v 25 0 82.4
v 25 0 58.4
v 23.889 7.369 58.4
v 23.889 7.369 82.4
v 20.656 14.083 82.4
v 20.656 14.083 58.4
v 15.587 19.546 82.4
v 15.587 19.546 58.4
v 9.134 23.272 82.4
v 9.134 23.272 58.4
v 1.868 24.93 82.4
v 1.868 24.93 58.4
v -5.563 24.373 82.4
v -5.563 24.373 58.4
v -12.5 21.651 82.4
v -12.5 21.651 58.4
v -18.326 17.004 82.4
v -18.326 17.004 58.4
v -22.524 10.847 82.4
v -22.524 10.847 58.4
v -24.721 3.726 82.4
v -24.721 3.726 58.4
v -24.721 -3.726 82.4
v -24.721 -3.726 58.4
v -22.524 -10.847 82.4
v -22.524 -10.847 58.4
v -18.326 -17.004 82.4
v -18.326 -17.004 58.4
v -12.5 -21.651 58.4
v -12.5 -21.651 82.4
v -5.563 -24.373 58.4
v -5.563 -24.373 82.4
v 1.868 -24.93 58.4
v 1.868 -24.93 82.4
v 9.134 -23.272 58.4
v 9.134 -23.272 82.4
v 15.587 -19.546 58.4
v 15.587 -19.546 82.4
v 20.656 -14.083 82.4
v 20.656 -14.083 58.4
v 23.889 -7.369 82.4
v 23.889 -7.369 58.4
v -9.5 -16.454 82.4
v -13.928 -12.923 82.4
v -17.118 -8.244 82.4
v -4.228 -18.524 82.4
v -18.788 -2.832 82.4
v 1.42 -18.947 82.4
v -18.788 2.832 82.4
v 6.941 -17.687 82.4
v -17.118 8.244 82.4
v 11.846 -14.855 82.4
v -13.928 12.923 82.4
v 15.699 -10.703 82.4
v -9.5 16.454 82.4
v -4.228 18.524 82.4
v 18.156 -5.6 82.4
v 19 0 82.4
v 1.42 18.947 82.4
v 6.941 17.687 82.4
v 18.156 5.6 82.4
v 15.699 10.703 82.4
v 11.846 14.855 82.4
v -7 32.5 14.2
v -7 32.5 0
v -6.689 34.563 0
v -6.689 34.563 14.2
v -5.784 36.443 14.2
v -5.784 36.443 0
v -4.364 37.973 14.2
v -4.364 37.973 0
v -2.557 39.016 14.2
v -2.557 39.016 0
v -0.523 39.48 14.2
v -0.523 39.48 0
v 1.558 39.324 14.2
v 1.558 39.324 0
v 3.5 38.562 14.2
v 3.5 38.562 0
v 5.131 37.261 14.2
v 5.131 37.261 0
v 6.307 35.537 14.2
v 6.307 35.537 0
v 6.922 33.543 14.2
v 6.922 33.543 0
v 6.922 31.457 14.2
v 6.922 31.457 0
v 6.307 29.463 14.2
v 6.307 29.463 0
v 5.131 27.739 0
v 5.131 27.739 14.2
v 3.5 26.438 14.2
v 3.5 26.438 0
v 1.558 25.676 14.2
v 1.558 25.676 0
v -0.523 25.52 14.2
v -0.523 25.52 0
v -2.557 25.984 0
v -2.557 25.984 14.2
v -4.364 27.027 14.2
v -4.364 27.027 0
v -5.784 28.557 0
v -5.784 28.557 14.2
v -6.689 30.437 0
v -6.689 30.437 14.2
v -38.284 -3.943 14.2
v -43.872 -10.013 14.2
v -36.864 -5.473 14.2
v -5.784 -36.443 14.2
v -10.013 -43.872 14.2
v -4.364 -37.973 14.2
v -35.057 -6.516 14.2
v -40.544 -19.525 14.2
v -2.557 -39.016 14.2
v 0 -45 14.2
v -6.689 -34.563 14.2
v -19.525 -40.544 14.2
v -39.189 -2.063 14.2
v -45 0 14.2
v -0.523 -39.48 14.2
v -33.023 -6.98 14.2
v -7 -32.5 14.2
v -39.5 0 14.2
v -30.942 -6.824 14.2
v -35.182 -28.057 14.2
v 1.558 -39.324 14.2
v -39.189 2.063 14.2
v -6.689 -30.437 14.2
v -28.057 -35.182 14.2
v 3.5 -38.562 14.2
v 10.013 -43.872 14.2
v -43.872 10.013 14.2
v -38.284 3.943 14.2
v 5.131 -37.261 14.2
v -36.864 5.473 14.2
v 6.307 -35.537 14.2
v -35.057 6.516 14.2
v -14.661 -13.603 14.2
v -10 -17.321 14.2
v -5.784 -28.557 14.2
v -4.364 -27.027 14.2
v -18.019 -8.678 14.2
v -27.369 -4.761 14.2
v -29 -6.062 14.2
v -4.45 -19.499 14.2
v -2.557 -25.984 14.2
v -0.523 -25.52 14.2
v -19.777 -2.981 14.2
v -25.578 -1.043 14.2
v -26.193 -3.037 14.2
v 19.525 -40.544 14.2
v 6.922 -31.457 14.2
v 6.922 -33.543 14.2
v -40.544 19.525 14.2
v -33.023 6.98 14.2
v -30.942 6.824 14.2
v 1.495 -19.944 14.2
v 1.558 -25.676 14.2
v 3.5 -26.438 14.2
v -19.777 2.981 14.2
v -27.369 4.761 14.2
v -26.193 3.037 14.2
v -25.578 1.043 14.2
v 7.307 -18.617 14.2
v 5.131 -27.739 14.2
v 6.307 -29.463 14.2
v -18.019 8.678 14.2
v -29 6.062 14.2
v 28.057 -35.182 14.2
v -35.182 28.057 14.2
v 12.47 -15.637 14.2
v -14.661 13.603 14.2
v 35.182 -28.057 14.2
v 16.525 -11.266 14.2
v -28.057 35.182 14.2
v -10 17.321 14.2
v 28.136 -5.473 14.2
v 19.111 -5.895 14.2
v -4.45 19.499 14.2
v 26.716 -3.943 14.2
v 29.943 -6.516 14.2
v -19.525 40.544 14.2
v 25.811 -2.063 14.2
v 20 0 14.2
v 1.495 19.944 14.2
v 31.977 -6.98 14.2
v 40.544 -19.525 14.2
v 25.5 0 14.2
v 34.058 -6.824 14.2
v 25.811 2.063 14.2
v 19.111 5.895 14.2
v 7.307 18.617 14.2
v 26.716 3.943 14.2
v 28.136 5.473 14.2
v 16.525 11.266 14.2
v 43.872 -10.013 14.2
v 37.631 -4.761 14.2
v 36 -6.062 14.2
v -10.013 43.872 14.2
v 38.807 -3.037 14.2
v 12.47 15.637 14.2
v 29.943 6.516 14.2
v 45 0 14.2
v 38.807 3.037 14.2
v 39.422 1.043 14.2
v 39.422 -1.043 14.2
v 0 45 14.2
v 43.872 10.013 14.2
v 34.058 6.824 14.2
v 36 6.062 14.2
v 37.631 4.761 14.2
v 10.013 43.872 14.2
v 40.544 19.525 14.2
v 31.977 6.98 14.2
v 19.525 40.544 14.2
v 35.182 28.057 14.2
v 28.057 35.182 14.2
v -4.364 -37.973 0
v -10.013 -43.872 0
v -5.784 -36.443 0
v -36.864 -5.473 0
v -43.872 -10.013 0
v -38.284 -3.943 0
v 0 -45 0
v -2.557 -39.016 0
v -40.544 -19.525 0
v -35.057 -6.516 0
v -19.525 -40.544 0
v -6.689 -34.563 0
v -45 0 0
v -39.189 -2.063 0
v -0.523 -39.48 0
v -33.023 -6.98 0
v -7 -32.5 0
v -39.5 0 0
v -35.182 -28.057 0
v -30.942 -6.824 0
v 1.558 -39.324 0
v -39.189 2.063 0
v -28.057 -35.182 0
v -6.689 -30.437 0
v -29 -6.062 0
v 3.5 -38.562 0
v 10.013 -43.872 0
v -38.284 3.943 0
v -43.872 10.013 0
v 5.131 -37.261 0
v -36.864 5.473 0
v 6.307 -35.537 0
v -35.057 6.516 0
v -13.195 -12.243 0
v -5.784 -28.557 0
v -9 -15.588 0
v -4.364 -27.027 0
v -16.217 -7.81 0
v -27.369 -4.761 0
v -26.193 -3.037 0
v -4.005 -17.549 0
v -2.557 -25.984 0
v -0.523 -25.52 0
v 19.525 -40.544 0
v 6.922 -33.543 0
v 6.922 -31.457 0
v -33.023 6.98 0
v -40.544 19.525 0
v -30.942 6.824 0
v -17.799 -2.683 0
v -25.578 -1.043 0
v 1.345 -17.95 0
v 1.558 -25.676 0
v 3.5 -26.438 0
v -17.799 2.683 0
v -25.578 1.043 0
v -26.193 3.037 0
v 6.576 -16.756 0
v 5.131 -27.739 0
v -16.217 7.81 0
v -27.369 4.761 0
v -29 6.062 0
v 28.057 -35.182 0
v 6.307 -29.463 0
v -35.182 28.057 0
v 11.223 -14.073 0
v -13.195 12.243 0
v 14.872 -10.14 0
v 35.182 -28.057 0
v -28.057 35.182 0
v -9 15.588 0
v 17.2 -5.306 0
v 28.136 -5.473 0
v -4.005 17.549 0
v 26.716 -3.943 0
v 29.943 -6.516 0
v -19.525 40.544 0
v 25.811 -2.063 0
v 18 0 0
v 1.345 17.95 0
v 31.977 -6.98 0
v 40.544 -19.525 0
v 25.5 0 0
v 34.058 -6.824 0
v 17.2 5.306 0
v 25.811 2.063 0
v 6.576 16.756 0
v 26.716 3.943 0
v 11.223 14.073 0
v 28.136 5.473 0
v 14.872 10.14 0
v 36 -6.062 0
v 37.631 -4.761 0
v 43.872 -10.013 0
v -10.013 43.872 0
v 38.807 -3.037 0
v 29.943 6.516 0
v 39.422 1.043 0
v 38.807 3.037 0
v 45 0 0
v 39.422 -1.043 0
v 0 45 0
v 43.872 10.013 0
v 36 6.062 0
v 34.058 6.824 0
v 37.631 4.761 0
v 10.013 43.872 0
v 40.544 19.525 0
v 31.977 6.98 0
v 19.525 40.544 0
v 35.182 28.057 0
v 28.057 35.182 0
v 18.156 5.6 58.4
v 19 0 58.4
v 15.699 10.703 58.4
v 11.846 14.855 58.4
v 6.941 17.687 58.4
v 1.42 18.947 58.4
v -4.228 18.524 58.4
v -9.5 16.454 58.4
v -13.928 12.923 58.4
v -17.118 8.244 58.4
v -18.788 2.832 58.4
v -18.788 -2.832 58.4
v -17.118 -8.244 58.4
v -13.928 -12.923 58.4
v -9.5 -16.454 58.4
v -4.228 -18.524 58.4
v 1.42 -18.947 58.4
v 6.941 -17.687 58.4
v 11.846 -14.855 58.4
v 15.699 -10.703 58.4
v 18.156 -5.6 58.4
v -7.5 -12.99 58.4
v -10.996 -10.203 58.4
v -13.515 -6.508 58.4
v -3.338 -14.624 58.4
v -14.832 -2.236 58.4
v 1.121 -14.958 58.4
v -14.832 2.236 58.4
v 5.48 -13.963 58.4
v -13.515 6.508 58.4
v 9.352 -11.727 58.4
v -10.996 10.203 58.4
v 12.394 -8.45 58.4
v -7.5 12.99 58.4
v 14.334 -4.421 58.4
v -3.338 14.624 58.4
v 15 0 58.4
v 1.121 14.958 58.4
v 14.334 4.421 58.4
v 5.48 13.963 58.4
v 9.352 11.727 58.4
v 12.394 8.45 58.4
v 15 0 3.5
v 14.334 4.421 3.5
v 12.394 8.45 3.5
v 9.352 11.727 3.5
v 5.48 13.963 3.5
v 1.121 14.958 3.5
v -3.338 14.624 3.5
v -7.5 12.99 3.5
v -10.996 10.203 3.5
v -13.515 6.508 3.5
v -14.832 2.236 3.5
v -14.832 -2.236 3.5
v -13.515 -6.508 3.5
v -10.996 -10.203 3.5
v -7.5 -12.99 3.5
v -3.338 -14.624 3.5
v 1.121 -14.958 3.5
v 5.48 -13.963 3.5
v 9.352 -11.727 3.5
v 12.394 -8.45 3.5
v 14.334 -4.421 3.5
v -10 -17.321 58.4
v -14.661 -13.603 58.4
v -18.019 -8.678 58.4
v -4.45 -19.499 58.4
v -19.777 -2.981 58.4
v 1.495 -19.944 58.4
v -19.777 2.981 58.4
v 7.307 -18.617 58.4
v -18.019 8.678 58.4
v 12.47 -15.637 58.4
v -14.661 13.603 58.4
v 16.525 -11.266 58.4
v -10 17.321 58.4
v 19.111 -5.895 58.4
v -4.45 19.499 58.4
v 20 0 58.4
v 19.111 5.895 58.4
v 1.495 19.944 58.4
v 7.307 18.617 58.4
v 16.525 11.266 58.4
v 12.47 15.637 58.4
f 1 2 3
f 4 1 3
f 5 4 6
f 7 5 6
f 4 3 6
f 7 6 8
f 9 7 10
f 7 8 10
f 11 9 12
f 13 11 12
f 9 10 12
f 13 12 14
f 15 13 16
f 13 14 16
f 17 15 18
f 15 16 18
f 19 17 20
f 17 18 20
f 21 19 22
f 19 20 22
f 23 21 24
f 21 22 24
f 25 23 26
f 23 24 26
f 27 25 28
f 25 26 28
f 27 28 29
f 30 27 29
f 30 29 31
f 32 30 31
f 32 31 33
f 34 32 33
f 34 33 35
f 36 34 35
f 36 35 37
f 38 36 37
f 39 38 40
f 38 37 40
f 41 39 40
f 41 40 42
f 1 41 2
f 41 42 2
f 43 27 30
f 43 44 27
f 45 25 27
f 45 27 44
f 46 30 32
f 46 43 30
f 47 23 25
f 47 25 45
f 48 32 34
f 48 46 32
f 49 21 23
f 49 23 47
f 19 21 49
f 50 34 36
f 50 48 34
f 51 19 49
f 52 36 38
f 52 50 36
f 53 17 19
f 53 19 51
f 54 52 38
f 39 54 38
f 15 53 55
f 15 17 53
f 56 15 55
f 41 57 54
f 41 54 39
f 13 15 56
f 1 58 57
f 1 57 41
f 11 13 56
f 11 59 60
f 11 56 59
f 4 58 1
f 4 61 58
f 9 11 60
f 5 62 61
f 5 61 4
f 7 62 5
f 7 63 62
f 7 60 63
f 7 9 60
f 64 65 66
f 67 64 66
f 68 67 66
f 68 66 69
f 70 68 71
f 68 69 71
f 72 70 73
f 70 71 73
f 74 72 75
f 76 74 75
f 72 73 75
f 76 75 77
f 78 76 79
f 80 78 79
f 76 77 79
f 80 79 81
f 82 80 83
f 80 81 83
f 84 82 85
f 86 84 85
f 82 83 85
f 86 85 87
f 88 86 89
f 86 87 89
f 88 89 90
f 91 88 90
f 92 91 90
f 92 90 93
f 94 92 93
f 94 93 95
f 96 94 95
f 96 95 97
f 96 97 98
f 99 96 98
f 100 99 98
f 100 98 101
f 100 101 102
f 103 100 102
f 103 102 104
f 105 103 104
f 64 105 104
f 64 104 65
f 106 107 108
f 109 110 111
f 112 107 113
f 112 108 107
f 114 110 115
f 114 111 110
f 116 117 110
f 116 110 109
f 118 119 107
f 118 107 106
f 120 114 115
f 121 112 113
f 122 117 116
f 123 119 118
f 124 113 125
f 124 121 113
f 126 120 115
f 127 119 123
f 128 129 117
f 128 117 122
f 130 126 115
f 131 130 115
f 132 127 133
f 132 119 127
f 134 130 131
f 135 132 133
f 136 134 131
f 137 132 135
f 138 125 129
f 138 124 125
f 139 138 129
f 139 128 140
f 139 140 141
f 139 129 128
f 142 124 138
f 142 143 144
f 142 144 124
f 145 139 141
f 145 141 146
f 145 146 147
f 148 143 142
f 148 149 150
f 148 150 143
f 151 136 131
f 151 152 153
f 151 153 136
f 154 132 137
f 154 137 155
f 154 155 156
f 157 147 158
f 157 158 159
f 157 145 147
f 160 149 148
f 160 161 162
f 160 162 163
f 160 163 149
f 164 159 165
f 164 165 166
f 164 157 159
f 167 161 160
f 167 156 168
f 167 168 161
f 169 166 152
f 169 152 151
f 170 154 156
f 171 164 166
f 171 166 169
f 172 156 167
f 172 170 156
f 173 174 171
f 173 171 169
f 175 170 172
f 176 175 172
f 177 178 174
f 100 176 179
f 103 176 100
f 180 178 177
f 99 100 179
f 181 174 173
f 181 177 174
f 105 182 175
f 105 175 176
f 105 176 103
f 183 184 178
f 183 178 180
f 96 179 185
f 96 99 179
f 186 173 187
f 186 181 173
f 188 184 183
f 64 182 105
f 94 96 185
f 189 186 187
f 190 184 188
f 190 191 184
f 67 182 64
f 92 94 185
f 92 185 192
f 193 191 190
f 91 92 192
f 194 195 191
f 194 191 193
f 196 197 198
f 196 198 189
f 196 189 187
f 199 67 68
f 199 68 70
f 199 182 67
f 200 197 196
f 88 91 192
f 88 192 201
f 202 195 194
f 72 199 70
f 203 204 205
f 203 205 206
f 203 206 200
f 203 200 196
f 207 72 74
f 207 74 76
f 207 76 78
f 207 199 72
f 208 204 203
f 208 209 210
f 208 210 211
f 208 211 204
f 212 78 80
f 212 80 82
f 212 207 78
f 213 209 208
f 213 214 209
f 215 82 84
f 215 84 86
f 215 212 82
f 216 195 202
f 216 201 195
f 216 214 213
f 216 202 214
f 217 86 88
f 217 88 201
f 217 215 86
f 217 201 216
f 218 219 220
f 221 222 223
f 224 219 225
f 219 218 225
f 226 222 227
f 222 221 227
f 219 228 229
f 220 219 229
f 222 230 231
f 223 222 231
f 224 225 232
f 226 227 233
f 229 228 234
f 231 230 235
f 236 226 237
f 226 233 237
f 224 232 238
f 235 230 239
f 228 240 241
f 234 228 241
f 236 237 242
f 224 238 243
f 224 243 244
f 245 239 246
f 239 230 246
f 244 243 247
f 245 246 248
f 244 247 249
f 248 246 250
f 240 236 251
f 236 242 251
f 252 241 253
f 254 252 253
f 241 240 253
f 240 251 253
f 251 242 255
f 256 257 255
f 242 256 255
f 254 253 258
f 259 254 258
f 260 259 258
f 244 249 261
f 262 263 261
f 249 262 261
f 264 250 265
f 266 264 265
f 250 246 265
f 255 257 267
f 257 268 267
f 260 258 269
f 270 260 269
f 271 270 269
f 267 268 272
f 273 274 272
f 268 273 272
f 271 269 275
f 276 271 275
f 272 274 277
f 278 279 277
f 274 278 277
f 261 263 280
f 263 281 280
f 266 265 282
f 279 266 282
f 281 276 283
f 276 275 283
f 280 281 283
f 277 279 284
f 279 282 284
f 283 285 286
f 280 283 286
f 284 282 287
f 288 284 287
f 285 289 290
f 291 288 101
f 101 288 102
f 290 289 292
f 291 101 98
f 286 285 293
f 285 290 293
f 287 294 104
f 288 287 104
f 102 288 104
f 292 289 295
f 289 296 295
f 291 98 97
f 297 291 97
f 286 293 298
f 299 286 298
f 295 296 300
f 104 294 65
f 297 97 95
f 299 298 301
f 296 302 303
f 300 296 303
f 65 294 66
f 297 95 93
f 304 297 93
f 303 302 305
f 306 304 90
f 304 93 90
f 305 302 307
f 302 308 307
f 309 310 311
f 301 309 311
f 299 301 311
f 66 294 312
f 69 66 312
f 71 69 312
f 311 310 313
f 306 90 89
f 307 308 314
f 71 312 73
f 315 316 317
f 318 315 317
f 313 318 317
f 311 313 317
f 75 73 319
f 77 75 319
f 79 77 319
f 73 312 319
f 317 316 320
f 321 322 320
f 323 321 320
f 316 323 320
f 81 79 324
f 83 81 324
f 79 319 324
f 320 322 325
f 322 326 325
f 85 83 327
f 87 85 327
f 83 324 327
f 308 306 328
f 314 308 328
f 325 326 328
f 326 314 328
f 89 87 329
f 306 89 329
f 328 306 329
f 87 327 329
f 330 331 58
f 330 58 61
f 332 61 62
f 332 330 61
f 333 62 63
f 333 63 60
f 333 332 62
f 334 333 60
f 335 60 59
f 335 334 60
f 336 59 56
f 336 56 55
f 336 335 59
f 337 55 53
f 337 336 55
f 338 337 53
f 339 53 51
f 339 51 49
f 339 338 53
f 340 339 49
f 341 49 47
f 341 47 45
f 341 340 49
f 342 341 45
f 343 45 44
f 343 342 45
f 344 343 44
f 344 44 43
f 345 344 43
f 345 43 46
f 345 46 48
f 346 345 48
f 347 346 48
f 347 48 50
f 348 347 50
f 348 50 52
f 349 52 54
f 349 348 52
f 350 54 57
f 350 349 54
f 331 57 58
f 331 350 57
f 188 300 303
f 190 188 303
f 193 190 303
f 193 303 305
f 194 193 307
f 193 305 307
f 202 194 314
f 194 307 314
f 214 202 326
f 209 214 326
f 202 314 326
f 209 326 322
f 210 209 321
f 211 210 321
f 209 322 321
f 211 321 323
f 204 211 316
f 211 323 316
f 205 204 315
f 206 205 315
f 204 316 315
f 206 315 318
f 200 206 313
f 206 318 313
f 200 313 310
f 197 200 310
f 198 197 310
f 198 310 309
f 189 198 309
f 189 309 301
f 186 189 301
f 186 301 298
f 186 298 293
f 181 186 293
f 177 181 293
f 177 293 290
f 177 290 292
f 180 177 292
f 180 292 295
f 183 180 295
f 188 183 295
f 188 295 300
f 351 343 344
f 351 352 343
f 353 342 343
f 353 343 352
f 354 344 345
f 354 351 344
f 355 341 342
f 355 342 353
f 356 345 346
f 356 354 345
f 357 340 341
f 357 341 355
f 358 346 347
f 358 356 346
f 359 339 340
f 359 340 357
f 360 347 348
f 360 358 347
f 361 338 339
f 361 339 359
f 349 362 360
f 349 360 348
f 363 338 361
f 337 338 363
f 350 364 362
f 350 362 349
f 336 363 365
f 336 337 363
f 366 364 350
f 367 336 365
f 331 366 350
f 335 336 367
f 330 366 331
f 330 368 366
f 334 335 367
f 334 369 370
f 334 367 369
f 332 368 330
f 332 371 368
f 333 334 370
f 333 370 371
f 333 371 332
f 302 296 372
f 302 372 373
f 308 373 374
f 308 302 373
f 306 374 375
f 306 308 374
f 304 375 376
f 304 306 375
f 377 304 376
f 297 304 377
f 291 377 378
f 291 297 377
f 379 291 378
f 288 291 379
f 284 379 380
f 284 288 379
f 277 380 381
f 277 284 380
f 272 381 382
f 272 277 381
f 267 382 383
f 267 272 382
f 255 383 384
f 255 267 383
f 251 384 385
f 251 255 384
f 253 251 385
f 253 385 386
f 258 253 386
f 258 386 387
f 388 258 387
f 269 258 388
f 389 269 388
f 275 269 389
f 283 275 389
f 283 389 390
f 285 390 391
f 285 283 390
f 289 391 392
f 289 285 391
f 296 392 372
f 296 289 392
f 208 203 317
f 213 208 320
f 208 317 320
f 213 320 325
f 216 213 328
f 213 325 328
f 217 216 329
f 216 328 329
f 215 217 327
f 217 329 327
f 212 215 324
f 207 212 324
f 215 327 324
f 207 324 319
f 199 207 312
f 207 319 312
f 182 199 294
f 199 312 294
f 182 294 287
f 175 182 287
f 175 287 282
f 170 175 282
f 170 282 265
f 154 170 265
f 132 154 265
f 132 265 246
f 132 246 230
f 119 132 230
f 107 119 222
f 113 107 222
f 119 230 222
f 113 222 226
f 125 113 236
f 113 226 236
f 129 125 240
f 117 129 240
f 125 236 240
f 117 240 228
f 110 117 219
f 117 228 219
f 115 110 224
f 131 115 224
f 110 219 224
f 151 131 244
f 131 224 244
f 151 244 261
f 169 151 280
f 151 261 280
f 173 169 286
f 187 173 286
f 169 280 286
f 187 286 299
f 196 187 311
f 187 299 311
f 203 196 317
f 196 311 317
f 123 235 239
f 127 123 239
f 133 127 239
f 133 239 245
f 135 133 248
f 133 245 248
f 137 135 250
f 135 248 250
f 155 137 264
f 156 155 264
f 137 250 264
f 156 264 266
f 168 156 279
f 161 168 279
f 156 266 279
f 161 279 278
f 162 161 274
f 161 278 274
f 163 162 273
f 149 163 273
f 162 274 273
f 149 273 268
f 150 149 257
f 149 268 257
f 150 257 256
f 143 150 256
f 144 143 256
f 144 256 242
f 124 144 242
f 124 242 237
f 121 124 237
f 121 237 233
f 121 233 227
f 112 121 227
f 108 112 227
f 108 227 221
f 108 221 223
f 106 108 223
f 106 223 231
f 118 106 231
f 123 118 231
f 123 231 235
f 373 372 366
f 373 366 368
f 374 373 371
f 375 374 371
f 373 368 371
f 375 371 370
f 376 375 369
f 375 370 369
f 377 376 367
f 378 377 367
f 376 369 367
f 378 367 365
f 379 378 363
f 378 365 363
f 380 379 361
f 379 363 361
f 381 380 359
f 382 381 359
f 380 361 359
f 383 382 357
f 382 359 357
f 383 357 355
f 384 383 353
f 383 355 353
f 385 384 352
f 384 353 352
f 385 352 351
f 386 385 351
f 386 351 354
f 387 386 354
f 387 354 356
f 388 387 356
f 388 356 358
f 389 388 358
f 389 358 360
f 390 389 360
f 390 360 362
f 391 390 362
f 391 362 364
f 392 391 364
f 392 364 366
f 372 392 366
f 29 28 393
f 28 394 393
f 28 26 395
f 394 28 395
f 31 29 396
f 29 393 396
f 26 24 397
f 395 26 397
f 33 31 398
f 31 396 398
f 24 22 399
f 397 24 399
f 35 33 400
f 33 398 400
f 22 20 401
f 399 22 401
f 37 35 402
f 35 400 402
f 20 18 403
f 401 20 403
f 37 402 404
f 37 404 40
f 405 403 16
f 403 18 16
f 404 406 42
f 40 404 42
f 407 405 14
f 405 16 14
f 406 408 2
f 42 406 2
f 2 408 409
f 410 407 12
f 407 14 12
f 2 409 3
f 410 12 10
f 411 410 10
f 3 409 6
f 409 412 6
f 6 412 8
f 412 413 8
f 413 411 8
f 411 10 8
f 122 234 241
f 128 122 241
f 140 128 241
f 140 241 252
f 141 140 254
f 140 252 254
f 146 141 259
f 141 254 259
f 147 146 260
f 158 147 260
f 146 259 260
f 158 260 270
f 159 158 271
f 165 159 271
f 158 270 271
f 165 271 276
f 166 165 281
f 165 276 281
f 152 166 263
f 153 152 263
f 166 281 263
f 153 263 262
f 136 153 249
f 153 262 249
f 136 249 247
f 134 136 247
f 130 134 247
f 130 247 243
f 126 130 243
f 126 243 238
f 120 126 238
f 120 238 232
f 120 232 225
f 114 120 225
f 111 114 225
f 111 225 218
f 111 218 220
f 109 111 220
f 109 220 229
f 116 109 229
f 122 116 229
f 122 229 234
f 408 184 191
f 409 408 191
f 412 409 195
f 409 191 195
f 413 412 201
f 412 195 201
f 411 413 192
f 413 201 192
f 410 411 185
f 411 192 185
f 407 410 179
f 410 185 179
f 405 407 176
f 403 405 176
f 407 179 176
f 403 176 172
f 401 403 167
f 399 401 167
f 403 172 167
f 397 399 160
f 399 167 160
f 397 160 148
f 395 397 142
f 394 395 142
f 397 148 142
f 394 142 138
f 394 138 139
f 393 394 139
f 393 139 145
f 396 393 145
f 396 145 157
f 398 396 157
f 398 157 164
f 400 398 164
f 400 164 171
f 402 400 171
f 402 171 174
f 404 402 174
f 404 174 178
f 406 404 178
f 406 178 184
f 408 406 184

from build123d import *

# Parameters (mm, degrees)
CROQUIS1_R               = 45
SALIENTE_EXTRUIR1_DEPTH  = 14.2
CROQUIS6_R               = 15
SALIENTE_EXTRUIR13_DEPTH = 14
CROQUIS8_R               = 15
CORTAR_EXTRUIR3_DEPTH    = 16
CROQUIS2_R               = 20
SALIENTE_EXTRUIR3_DEPTH  = 58.4
CROQUIS3_R               = 25
CROQUIS3_R_2             = 19
SALIENTE_EXTRUIR4_DEPTH  = 24
CROQUIS5_R               = 15
CORTAR_EXTRUIR4_DEPTH    = 59
CROQUIS7_R               = 7
CORTAR_EXTRUIR18_DEPTH   = 17
CHAFL_N1_SIZE            = 3.5
CHAFL_N1_SIZE2           = 3


with BuildPart() as part:
    # Croquis1 → Saliente-Extruir1 (new body)
    with BuildSketch(Plane.XY):
        Circle(CROQUIS1_R)
    extrude(amount=SALIENTE_EXTRUIR1_DEPTH)

    # Croquis6 → Saliente-Extruir13 (add)
    with BuildSketch(Plane.XY.offset(14.2)):
        Circle(CROQUIS6_R)
    extrude(amount=-SALIENTE_EXTRUIR13_DEPTH)

    # Croquis8 → Cortar-Extruir3 (cut)
    with BuildSketch(Plane.XY.offset(14.2)):
        Circle(CROQUIS8_R)
    extrude(amount=-CORTAR_EXTRUIR3_DEPTH, mode=Mode.SUBTRACT)

    # Croquis2 → Saliente-Extruir3 (add)
    with BuildSketch(Plane.XY):
        Circle(CROQUIS2_R)
    extrude(amount=SALIENTE_EXTRUIR3_DEPTH)

    # Croquis3 → Saliente-Extruir4 (add)
    with BuildSketch(Plane.XY.offset(58.4)):
        Circle(CROQUIS3_R)
        Circle(CROQUIS3_R_2, mode=Mode.SUBTRACT)
    extrude(amount=SALIENTE_EXTRUIR4_DEPTH)

    # Croquis5 → Cortar-Extruir4 (cut)
    with BuildSketch(Plane.XY.offset(58.4)):
        Circle(CROQUIS5_R)
    extrude(amount=-CORTAR_EXTRUIR4_DEPTH, mode=Mode.SUBTRACT)

    # Croquis7 → Cortar-Extruir18 (cut)
    with BuildSketch(Plane(origin=(0, 0, 0), x_dir=(-1, 0, 0), z_dir=(0, 0, -1))):
        with Locations((0, 32.5)):
            Circle(CROQUIS7_R)
        with Locations((32.5, 0)):
            Circle(CROQUIS7_R)
        with Locations((0, -32.5)):
            Circle(CROQUIS7_R)
        with Locations((-32.5, 0)):
            Circle(CROQUIS7_R)
    extrude(amount=-CORTAR_EXTRUIR18_DEPTH, mode=Mode.SUBTRACT)

    # Chaflán1
    chafl_n1_edges = [part.edges().sort_by_distance(p)[0] for p in [
        (-15, 0, 0),
    ]]
    chafl_n1_side = [part.faces().sort_by_distance(p)[0] for p in [
        (-15, 0, 29.2),
    ]]
    chamfer(chafl_n1_edges, length=CHAFL_N1_SIZE, length2=CHAFL_N1_SIZE2, reference=chafl_n1_side[0])


solid = part.part
